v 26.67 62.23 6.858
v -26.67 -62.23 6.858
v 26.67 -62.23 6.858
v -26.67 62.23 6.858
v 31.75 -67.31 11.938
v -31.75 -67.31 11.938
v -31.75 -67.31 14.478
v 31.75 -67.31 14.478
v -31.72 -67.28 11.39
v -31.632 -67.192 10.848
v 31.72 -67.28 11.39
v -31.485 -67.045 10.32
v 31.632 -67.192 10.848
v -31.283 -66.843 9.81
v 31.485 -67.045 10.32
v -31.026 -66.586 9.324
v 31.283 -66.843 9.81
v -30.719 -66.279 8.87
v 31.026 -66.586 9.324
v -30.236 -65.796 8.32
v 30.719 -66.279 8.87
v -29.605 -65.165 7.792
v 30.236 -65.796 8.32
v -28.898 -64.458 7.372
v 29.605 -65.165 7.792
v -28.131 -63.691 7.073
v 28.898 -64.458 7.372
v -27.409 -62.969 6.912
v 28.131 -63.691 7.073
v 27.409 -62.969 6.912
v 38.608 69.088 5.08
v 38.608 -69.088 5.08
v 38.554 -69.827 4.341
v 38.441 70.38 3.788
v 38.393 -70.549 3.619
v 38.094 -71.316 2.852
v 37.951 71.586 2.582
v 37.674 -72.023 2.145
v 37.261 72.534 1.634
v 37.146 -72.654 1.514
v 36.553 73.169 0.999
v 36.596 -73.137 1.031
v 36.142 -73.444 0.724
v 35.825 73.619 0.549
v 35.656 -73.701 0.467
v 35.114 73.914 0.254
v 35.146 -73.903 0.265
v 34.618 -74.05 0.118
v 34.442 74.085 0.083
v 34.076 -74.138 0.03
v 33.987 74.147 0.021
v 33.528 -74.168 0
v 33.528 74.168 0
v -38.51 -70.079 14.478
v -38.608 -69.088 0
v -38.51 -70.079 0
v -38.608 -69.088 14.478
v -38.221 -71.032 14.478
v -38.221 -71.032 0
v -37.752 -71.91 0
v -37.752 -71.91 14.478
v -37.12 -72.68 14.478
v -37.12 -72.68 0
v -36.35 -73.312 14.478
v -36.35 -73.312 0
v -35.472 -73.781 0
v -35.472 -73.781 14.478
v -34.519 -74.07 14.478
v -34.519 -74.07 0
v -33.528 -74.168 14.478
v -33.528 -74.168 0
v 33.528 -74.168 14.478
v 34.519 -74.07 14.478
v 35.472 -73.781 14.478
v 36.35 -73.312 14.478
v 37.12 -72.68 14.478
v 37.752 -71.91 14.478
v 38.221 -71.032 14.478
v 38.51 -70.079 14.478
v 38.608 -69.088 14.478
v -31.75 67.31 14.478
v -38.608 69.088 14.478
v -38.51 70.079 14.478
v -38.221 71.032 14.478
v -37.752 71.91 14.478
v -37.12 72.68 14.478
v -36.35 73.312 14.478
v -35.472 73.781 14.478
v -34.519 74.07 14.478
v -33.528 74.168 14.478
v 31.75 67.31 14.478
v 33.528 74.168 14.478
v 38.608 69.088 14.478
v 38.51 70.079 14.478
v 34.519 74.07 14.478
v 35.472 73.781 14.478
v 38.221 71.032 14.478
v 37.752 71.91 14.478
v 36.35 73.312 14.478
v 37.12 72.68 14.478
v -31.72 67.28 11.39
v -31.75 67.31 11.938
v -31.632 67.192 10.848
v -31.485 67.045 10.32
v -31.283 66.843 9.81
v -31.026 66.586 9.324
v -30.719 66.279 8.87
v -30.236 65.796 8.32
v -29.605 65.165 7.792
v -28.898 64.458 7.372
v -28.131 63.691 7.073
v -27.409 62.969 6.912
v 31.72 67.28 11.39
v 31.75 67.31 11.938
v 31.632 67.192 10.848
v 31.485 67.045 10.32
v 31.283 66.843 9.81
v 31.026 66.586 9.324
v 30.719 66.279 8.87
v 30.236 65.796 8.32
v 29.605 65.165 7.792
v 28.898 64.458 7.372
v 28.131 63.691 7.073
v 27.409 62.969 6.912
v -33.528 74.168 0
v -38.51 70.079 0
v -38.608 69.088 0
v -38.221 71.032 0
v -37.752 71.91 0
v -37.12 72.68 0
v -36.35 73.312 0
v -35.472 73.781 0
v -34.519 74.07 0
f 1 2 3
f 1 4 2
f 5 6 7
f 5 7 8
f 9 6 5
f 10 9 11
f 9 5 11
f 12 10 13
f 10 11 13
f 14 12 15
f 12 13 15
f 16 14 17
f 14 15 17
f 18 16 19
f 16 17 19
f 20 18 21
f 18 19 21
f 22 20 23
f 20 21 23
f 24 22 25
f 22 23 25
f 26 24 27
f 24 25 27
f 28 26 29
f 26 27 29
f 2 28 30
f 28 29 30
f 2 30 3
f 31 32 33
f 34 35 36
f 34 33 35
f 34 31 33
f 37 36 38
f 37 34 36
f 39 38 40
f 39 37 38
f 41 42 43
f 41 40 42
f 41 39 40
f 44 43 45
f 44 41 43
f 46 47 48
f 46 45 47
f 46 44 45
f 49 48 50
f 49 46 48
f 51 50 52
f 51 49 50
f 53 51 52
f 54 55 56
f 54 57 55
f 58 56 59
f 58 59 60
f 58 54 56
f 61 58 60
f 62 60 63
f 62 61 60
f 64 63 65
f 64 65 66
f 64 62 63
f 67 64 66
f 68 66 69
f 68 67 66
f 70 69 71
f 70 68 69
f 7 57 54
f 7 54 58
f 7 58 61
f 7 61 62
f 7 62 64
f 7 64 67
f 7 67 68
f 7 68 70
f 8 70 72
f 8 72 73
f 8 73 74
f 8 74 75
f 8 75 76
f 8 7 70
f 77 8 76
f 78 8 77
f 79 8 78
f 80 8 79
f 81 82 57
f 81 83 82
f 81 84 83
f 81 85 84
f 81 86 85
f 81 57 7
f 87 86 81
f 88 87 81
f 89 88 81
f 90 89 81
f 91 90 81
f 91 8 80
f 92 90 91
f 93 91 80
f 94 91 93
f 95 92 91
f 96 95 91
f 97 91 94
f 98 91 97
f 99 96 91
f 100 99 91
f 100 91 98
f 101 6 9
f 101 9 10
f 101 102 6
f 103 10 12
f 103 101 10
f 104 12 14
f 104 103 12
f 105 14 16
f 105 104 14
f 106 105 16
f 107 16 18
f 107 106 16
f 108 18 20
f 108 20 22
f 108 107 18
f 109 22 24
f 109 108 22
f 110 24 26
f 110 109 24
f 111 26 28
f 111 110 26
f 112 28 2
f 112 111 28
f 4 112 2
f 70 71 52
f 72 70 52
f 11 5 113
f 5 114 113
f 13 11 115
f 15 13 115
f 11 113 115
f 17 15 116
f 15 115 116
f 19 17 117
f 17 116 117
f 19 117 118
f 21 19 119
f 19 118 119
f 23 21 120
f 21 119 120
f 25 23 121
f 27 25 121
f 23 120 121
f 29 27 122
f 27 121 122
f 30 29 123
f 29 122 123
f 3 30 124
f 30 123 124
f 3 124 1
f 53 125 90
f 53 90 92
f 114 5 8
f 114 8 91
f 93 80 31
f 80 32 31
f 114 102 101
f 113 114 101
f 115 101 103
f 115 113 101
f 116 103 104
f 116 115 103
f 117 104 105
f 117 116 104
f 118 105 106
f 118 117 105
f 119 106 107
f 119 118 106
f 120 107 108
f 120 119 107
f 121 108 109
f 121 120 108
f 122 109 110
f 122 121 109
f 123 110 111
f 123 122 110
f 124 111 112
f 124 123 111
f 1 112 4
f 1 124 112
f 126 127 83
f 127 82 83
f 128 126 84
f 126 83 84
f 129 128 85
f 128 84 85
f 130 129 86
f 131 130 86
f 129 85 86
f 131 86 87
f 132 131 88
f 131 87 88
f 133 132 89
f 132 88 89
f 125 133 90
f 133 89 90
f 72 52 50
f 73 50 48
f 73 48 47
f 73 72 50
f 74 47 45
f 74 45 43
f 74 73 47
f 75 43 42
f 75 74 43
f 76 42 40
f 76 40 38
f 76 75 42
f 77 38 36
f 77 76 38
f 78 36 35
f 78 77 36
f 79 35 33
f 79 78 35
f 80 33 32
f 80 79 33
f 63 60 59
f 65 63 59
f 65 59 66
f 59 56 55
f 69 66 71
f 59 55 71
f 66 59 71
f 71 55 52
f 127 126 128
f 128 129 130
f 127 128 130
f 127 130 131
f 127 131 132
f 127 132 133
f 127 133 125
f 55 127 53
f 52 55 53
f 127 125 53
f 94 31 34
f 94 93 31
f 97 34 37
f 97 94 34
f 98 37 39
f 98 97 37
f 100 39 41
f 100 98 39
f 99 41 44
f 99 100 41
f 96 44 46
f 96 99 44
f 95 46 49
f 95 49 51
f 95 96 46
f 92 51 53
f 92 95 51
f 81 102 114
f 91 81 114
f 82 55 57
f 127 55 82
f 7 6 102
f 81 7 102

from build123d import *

# Parameters (mm, degrees)
F0_W     = 77.216
F0_H     = 148.336
F1_DEPTH = 14.478
F2_R     = 5.08
F3_T     = -6.858
F4_R     = 5.08


with BuildPart() as f1:
    # F0 (on Top) → F1 (new body)
    with BuildSketch(Plane.XY):
        Rectangle(F0_W, F0_H)
    extrude(amount=F1_DEPTH)

    # F2
    f2_edges = [f1.edges().sort_by_distance(p)[0] for p in [
        (-38.608, 74.168, 7.239),
        (38.608, 74.168, 7.239),
        (38.608, -74.168, 7.239),
        (-38.608, -74.168, 7.239),
        (38.608, 0, 0),
    ]]
    fillet(f2_edges, radius=F2_R)

    # F3
    f3_openings = [f1.faces().sort_by_distance(p)[0] for p in [
        (0, 0, 14.478),
    ]]
    offset(amount=F3_T, openings=f3_openings)

    # F4
    f4_edges = [f1.edges().sort_by_distance(p)[0] for p in [
        (0, -67.31, 6.858),
        (31.75, 0, 6.858),
        (0, 67.31, 6.858),
        (-31.75, 0, 6.858),
    ]]
    fillet(f4_edges, radius=F4_R)


solid = f1.part
